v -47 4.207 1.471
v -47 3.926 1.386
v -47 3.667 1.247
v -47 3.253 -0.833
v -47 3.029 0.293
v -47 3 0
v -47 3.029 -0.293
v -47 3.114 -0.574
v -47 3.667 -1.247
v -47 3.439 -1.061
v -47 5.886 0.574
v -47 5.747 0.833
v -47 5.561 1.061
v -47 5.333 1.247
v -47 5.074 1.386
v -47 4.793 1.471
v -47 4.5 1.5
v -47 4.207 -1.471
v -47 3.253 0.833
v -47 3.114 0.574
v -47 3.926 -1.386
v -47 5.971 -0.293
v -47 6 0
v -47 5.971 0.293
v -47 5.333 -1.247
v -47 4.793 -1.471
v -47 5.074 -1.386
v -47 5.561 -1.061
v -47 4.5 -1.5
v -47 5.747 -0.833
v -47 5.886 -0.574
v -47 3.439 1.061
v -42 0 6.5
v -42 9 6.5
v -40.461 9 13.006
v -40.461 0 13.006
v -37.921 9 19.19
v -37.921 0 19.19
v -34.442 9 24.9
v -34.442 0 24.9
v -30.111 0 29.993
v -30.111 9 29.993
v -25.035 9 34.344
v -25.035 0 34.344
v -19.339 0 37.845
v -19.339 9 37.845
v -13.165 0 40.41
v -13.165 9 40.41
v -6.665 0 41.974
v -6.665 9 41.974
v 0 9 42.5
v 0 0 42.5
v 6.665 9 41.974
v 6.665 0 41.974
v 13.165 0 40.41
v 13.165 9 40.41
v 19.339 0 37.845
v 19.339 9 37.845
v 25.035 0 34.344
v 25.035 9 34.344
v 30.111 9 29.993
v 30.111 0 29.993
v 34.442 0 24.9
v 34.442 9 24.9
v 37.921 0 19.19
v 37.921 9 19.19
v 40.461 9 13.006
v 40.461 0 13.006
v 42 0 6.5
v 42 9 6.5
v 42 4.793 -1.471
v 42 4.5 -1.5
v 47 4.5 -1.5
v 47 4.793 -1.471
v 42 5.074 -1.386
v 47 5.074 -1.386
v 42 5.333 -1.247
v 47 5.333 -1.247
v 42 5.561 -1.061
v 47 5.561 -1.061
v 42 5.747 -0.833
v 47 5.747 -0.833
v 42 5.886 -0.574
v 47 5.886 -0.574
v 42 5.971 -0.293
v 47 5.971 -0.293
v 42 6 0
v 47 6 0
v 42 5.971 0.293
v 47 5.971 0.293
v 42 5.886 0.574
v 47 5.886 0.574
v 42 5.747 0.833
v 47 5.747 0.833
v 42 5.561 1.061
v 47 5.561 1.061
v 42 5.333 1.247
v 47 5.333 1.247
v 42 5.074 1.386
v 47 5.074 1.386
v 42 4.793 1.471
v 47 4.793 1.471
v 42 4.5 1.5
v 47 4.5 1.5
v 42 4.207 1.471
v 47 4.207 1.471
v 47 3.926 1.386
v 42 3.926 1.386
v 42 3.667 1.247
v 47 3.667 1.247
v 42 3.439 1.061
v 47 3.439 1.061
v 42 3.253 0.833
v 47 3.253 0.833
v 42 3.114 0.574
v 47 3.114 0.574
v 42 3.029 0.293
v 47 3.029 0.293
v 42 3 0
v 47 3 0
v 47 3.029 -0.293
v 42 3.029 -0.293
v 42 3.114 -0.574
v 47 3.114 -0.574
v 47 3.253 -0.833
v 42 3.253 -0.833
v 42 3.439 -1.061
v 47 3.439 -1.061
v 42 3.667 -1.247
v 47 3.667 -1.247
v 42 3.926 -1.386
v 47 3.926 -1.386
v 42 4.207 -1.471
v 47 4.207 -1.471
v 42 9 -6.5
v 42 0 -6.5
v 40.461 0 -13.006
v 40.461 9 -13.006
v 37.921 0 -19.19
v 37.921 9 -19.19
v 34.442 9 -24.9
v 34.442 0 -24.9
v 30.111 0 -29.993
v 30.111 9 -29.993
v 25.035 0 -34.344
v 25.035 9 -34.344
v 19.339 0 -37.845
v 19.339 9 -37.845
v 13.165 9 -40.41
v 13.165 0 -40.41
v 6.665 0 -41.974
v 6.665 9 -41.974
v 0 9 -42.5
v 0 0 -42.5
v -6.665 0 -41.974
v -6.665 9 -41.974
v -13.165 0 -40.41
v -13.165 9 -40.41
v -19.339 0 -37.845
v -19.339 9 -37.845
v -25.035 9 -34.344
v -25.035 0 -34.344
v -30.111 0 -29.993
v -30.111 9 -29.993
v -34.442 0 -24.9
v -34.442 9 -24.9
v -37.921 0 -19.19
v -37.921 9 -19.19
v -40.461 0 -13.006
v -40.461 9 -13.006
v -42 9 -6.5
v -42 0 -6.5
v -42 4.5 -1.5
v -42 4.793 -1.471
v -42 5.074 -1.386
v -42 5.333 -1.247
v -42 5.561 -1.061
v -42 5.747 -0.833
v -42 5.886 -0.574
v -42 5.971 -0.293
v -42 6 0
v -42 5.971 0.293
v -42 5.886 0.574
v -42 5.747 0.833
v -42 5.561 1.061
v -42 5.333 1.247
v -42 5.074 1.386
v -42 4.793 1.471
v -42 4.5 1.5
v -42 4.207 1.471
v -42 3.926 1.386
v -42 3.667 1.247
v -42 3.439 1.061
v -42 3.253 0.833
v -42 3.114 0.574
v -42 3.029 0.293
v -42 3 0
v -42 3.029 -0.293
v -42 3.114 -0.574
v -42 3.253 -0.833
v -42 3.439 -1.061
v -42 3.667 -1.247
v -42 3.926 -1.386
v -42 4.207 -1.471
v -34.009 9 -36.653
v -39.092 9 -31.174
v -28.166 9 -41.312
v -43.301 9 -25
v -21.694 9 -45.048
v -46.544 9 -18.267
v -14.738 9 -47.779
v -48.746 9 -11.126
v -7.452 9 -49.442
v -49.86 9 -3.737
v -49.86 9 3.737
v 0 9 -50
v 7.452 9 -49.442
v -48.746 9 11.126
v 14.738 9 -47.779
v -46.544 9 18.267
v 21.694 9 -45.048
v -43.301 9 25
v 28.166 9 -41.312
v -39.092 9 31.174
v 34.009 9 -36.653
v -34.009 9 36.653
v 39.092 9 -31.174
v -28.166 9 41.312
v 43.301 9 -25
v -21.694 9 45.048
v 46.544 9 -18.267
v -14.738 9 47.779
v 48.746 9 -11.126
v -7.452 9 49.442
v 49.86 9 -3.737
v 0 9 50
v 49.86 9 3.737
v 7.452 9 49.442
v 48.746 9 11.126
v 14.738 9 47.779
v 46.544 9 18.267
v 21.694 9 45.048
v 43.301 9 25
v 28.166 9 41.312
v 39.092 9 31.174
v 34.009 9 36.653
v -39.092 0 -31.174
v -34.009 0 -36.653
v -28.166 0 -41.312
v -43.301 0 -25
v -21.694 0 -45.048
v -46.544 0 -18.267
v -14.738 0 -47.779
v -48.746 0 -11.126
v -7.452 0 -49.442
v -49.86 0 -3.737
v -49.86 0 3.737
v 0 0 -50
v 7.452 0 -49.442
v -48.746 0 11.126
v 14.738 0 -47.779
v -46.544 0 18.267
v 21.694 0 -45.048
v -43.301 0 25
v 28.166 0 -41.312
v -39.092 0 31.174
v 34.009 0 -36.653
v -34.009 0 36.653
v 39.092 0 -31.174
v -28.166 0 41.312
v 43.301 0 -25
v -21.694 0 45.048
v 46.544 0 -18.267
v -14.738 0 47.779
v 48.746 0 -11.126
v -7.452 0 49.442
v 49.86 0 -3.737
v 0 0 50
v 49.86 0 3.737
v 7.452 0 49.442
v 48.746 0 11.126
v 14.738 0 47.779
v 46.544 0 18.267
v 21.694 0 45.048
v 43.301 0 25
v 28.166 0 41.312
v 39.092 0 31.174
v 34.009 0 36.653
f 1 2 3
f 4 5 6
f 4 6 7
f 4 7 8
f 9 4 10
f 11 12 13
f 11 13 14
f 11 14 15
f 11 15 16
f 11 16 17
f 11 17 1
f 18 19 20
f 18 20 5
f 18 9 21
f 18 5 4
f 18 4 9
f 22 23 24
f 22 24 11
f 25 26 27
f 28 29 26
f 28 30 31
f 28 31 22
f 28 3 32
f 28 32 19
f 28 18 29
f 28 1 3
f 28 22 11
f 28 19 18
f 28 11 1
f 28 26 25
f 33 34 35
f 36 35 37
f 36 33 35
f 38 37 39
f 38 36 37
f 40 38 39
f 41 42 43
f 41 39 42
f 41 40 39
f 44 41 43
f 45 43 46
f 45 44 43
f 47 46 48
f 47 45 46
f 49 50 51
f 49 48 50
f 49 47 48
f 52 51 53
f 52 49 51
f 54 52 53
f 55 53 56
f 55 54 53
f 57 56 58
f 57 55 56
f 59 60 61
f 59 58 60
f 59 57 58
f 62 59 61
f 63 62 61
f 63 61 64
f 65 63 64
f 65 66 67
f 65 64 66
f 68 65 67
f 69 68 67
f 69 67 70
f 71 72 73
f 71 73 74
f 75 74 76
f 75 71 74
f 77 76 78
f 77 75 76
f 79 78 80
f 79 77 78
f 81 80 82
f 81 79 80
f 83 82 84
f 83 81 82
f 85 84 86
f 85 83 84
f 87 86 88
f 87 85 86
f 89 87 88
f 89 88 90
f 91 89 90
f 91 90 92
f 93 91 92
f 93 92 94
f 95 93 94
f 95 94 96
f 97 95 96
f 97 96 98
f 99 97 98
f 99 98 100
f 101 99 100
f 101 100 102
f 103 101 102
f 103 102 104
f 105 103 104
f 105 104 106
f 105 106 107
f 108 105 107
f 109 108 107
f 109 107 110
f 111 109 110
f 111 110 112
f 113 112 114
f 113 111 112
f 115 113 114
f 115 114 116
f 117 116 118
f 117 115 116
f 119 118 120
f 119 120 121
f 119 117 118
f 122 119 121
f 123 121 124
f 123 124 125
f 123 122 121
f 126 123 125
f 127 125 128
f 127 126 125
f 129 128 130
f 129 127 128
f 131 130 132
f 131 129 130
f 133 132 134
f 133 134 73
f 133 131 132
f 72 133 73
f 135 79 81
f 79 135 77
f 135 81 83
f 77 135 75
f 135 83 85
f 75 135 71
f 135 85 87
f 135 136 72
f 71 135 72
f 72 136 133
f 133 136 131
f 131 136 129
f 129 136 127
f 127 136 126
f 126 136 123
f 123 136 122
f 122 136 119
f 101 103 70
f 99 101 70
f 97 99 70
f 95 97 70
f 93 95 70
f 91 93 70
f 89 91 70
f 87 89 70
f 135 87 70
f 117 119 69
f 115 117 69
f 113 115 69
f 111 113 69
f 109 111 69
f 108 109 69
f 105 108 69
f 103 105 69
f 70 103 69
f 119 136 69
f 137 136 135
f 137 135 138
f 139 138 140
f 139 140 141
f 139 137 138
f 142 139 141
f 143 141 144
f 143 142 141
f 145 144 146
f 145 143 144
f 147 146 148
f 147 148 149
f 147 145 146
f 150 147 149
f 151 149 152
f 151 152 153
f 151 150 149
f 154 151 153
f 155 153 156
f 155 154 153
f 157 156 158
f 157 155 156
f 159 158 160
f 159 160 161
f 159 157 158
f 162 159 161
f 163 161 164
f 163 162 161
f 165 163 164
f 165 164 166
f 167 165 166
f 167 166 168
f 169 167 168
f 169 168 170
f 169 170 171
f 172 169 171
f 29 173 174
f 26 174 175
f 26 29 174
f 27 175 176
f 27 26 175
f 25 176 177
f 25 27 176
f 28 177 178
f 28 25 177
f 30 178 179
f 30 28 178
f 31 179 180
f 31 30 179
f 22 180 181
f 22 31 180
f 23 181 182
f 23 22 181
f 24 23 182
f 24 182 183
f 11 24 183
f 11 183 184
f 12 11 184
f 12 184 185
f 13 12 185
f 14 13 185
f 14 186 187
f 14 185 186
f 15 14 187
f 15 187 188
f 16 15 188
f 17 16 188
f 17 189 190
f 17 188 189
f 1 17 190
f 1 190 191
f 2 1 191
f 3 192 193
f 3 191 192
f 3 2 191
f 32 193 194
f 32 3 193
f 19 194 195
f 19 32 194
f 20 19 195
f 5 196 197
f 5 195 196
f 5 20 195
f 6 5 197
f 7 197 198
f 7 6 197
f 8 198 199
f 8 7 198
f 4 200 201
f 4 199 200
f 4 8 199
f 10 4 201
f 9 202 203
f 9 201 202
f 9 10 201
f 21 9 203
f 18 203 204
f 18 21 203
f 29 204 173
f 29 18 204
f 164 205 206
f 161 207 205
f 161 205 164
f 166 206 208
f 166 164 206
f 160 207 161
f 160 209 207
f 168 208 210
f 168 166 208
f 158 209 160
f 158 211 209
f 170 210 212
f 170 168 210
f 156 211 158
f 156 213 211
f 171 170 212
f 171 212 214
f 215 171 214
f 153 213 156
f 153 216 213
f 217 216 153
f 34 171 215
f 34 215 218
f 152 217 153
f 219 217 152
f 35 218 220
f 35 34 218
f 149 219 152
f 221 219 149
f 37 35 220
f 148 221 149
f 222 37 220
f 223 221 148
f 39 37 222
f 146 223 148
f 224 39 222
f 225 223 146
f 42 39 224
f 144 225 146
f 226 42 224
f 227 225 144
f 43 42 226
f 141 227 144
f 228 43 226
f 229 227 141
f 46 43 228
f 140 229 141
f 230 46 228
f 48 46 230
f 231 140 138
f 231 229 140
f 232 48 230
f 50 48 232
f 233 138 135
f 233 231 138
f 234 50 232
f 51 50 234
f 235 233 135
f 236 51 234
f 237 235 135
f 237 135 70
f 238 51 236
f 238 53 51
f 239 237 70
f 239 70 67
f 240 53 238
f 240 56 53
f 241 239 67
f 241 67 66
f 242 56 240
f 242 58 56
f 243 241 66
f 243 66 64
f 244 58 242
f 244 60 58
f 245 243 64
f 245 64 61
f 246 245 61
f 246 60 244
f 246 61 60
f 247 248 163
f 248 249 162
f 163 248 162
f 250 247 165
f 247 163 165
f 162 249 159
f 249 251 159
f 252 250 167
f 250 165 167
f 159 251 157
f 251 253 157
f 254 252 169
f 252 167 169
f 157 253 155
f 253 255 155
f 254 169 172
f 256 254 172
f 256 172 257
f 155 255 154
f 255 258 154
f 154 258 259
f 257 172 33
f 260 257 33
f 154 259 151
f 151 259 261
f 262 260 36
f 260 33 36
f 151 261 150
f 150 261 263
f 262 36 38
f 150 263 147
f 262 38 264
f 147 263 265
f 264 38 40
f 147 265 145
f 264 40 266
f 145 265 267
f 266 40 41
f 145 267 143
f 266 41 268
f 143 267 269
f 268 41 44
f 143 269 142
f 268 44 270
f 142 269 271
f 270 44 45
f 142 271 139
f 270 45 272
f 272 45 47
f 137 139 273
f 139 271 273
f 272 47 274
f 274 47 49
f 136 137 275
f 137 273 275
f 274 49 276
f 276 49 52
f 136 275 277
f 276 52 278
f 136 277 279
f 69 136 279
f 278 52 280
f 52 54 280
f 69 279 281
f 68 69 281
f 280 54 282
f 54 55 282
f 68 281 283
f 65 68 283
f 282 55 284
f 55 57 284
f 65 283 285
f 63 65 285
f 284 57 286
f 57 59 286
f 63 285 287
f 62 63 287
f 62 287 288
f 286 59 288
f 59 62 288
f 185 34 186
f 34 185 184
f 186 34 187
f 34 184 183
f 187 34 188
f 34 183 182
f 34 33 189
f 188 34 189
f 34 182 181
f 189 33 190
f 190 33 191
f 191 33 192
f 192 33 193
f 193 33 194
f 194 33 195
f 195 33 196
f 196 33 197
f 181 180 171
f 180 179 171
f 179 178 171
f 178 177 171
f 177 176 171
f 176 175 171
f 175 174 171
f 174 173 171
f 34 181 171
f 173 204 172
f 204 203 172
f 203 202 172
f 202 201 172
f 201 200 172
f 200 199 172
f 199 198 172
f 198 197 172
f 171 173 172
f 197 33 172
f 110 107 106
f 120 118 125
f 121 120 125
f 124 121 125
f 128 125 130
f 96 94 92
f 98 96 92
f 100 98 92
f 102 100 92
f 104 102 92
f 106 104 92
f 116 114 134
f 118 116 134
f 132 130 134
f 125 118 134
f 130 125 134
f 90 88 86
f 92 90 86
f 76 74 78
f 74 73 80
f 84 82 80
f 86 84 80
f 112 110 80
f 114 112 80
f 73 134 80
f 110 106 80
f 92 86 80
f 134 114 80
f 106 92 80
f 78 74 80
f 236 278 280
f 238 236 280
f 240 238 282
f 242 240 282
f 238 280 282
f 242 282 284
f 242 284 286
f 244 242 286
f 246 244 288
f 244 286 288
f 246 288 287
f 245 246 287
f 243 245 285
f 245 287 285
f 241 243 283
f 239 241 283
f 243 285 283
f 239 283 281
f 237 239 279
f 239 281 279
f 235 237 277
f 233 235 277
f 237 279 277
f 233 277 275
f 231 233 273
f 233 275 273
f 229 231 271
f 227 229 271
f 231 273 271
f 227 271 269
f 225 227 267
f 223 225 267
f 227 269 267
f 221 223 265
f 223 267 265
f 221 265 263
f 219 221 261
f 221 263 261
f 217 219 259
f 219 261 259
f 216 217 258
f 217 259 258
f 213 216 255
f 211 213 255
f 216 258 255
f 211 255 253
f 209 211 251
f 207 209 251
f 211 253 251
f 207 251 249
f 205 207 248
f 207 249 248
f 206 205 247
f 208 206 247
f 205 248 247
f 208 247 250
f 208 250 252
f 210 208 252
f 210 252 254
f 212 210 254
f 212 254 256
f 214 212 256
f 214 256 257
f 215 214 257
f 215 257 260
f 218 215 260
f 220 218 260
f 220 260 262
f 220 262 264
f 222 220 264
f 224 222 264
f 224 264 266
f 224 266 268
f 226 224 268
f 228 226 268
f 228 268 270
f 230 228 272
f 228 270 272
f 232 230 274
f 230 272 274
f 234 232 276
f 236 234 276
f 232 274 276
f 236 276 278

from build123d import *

# Parameters (mm, degrees)
SKETCH1_R               = 50
SKETCH1_R_2             = 42.5
BOSS_EXTRUDE1_DEPTH     = 9
BOSS_EXTRUDE2_START     = -9
BOSS_EXTRUDE2_DEPTH     = 9
CUT_EXTRUDE1_DEPTH      = 89
CUT_EXTRUDE1_DEPTH_BACK = 5
SKETCH3_R               = 1.5


with BuildPart() as part:
    # Sketch1 → Boss-Extrude1 (new body)
    with BuildSketch(Plane(origin=(0, 0, 0), x_dir=(1, 0, 0), z_dir=(0, 1, 0))):
        with Locations(Location((0, 0, 0), (0, 0, 270))):
            Circle(SKETCH1_R)
        with Locations(Location((0, 0, 0), (0, 0, 270))):
            Circle(SKETCH1_R_2, mode=Mode.SUBTRACT)
    extrude(amount=BOSS_EXTRUDE1_DEPTH)

    # Sketch2 → Boss-Extrude2 (add)
    with BuildSketch(Plane(origin=(0, 9, 0), x_dir=(1, 0, 0), z_dir=(0, 1, 0)).offset(BOSS_EXTRUDE2_START)):
        with BuildLine():
            ThreePointArc((-42, 6.5), (-42.5, 0), (-42, -6.5))
            Line((-42, -6.5), (-42, 6.5))
        make_face()
        with BuildLine():
            Line((42, 6.5), (42, -6.5))
            ThreePointArc((42, -6.5), (42.374815634, -3.259601203), (42.5, 0))
            ThreePointArc((42.5, 0), (42.374815634, 3.259601203), (42, 6.5))
        make_face()
    extrude(amount=BOSS_EXTRUDE2_DEPTH)

    # Sketch3 → Cut-Extrude1 (cut, two sides: drawn at the far end of the back side and taken through both)
    with BuildSketch(Plane(origin=(-42, 0, 0), x_dir=(0, 0, -1), z_dir=(1, 0, 0)).offset(-CUT_EXTRUDE1_DEPTH_BACK)):
        with Locations((0, 4.5)):
            Circle(SKETCH3_R)
    extrude(amount=CUT_EXTRUDE1_DEPTH + CUT_EXTRUDE1_DEPTH_BACK, mode=Mode.SUBTRACT)


solid = part.part
